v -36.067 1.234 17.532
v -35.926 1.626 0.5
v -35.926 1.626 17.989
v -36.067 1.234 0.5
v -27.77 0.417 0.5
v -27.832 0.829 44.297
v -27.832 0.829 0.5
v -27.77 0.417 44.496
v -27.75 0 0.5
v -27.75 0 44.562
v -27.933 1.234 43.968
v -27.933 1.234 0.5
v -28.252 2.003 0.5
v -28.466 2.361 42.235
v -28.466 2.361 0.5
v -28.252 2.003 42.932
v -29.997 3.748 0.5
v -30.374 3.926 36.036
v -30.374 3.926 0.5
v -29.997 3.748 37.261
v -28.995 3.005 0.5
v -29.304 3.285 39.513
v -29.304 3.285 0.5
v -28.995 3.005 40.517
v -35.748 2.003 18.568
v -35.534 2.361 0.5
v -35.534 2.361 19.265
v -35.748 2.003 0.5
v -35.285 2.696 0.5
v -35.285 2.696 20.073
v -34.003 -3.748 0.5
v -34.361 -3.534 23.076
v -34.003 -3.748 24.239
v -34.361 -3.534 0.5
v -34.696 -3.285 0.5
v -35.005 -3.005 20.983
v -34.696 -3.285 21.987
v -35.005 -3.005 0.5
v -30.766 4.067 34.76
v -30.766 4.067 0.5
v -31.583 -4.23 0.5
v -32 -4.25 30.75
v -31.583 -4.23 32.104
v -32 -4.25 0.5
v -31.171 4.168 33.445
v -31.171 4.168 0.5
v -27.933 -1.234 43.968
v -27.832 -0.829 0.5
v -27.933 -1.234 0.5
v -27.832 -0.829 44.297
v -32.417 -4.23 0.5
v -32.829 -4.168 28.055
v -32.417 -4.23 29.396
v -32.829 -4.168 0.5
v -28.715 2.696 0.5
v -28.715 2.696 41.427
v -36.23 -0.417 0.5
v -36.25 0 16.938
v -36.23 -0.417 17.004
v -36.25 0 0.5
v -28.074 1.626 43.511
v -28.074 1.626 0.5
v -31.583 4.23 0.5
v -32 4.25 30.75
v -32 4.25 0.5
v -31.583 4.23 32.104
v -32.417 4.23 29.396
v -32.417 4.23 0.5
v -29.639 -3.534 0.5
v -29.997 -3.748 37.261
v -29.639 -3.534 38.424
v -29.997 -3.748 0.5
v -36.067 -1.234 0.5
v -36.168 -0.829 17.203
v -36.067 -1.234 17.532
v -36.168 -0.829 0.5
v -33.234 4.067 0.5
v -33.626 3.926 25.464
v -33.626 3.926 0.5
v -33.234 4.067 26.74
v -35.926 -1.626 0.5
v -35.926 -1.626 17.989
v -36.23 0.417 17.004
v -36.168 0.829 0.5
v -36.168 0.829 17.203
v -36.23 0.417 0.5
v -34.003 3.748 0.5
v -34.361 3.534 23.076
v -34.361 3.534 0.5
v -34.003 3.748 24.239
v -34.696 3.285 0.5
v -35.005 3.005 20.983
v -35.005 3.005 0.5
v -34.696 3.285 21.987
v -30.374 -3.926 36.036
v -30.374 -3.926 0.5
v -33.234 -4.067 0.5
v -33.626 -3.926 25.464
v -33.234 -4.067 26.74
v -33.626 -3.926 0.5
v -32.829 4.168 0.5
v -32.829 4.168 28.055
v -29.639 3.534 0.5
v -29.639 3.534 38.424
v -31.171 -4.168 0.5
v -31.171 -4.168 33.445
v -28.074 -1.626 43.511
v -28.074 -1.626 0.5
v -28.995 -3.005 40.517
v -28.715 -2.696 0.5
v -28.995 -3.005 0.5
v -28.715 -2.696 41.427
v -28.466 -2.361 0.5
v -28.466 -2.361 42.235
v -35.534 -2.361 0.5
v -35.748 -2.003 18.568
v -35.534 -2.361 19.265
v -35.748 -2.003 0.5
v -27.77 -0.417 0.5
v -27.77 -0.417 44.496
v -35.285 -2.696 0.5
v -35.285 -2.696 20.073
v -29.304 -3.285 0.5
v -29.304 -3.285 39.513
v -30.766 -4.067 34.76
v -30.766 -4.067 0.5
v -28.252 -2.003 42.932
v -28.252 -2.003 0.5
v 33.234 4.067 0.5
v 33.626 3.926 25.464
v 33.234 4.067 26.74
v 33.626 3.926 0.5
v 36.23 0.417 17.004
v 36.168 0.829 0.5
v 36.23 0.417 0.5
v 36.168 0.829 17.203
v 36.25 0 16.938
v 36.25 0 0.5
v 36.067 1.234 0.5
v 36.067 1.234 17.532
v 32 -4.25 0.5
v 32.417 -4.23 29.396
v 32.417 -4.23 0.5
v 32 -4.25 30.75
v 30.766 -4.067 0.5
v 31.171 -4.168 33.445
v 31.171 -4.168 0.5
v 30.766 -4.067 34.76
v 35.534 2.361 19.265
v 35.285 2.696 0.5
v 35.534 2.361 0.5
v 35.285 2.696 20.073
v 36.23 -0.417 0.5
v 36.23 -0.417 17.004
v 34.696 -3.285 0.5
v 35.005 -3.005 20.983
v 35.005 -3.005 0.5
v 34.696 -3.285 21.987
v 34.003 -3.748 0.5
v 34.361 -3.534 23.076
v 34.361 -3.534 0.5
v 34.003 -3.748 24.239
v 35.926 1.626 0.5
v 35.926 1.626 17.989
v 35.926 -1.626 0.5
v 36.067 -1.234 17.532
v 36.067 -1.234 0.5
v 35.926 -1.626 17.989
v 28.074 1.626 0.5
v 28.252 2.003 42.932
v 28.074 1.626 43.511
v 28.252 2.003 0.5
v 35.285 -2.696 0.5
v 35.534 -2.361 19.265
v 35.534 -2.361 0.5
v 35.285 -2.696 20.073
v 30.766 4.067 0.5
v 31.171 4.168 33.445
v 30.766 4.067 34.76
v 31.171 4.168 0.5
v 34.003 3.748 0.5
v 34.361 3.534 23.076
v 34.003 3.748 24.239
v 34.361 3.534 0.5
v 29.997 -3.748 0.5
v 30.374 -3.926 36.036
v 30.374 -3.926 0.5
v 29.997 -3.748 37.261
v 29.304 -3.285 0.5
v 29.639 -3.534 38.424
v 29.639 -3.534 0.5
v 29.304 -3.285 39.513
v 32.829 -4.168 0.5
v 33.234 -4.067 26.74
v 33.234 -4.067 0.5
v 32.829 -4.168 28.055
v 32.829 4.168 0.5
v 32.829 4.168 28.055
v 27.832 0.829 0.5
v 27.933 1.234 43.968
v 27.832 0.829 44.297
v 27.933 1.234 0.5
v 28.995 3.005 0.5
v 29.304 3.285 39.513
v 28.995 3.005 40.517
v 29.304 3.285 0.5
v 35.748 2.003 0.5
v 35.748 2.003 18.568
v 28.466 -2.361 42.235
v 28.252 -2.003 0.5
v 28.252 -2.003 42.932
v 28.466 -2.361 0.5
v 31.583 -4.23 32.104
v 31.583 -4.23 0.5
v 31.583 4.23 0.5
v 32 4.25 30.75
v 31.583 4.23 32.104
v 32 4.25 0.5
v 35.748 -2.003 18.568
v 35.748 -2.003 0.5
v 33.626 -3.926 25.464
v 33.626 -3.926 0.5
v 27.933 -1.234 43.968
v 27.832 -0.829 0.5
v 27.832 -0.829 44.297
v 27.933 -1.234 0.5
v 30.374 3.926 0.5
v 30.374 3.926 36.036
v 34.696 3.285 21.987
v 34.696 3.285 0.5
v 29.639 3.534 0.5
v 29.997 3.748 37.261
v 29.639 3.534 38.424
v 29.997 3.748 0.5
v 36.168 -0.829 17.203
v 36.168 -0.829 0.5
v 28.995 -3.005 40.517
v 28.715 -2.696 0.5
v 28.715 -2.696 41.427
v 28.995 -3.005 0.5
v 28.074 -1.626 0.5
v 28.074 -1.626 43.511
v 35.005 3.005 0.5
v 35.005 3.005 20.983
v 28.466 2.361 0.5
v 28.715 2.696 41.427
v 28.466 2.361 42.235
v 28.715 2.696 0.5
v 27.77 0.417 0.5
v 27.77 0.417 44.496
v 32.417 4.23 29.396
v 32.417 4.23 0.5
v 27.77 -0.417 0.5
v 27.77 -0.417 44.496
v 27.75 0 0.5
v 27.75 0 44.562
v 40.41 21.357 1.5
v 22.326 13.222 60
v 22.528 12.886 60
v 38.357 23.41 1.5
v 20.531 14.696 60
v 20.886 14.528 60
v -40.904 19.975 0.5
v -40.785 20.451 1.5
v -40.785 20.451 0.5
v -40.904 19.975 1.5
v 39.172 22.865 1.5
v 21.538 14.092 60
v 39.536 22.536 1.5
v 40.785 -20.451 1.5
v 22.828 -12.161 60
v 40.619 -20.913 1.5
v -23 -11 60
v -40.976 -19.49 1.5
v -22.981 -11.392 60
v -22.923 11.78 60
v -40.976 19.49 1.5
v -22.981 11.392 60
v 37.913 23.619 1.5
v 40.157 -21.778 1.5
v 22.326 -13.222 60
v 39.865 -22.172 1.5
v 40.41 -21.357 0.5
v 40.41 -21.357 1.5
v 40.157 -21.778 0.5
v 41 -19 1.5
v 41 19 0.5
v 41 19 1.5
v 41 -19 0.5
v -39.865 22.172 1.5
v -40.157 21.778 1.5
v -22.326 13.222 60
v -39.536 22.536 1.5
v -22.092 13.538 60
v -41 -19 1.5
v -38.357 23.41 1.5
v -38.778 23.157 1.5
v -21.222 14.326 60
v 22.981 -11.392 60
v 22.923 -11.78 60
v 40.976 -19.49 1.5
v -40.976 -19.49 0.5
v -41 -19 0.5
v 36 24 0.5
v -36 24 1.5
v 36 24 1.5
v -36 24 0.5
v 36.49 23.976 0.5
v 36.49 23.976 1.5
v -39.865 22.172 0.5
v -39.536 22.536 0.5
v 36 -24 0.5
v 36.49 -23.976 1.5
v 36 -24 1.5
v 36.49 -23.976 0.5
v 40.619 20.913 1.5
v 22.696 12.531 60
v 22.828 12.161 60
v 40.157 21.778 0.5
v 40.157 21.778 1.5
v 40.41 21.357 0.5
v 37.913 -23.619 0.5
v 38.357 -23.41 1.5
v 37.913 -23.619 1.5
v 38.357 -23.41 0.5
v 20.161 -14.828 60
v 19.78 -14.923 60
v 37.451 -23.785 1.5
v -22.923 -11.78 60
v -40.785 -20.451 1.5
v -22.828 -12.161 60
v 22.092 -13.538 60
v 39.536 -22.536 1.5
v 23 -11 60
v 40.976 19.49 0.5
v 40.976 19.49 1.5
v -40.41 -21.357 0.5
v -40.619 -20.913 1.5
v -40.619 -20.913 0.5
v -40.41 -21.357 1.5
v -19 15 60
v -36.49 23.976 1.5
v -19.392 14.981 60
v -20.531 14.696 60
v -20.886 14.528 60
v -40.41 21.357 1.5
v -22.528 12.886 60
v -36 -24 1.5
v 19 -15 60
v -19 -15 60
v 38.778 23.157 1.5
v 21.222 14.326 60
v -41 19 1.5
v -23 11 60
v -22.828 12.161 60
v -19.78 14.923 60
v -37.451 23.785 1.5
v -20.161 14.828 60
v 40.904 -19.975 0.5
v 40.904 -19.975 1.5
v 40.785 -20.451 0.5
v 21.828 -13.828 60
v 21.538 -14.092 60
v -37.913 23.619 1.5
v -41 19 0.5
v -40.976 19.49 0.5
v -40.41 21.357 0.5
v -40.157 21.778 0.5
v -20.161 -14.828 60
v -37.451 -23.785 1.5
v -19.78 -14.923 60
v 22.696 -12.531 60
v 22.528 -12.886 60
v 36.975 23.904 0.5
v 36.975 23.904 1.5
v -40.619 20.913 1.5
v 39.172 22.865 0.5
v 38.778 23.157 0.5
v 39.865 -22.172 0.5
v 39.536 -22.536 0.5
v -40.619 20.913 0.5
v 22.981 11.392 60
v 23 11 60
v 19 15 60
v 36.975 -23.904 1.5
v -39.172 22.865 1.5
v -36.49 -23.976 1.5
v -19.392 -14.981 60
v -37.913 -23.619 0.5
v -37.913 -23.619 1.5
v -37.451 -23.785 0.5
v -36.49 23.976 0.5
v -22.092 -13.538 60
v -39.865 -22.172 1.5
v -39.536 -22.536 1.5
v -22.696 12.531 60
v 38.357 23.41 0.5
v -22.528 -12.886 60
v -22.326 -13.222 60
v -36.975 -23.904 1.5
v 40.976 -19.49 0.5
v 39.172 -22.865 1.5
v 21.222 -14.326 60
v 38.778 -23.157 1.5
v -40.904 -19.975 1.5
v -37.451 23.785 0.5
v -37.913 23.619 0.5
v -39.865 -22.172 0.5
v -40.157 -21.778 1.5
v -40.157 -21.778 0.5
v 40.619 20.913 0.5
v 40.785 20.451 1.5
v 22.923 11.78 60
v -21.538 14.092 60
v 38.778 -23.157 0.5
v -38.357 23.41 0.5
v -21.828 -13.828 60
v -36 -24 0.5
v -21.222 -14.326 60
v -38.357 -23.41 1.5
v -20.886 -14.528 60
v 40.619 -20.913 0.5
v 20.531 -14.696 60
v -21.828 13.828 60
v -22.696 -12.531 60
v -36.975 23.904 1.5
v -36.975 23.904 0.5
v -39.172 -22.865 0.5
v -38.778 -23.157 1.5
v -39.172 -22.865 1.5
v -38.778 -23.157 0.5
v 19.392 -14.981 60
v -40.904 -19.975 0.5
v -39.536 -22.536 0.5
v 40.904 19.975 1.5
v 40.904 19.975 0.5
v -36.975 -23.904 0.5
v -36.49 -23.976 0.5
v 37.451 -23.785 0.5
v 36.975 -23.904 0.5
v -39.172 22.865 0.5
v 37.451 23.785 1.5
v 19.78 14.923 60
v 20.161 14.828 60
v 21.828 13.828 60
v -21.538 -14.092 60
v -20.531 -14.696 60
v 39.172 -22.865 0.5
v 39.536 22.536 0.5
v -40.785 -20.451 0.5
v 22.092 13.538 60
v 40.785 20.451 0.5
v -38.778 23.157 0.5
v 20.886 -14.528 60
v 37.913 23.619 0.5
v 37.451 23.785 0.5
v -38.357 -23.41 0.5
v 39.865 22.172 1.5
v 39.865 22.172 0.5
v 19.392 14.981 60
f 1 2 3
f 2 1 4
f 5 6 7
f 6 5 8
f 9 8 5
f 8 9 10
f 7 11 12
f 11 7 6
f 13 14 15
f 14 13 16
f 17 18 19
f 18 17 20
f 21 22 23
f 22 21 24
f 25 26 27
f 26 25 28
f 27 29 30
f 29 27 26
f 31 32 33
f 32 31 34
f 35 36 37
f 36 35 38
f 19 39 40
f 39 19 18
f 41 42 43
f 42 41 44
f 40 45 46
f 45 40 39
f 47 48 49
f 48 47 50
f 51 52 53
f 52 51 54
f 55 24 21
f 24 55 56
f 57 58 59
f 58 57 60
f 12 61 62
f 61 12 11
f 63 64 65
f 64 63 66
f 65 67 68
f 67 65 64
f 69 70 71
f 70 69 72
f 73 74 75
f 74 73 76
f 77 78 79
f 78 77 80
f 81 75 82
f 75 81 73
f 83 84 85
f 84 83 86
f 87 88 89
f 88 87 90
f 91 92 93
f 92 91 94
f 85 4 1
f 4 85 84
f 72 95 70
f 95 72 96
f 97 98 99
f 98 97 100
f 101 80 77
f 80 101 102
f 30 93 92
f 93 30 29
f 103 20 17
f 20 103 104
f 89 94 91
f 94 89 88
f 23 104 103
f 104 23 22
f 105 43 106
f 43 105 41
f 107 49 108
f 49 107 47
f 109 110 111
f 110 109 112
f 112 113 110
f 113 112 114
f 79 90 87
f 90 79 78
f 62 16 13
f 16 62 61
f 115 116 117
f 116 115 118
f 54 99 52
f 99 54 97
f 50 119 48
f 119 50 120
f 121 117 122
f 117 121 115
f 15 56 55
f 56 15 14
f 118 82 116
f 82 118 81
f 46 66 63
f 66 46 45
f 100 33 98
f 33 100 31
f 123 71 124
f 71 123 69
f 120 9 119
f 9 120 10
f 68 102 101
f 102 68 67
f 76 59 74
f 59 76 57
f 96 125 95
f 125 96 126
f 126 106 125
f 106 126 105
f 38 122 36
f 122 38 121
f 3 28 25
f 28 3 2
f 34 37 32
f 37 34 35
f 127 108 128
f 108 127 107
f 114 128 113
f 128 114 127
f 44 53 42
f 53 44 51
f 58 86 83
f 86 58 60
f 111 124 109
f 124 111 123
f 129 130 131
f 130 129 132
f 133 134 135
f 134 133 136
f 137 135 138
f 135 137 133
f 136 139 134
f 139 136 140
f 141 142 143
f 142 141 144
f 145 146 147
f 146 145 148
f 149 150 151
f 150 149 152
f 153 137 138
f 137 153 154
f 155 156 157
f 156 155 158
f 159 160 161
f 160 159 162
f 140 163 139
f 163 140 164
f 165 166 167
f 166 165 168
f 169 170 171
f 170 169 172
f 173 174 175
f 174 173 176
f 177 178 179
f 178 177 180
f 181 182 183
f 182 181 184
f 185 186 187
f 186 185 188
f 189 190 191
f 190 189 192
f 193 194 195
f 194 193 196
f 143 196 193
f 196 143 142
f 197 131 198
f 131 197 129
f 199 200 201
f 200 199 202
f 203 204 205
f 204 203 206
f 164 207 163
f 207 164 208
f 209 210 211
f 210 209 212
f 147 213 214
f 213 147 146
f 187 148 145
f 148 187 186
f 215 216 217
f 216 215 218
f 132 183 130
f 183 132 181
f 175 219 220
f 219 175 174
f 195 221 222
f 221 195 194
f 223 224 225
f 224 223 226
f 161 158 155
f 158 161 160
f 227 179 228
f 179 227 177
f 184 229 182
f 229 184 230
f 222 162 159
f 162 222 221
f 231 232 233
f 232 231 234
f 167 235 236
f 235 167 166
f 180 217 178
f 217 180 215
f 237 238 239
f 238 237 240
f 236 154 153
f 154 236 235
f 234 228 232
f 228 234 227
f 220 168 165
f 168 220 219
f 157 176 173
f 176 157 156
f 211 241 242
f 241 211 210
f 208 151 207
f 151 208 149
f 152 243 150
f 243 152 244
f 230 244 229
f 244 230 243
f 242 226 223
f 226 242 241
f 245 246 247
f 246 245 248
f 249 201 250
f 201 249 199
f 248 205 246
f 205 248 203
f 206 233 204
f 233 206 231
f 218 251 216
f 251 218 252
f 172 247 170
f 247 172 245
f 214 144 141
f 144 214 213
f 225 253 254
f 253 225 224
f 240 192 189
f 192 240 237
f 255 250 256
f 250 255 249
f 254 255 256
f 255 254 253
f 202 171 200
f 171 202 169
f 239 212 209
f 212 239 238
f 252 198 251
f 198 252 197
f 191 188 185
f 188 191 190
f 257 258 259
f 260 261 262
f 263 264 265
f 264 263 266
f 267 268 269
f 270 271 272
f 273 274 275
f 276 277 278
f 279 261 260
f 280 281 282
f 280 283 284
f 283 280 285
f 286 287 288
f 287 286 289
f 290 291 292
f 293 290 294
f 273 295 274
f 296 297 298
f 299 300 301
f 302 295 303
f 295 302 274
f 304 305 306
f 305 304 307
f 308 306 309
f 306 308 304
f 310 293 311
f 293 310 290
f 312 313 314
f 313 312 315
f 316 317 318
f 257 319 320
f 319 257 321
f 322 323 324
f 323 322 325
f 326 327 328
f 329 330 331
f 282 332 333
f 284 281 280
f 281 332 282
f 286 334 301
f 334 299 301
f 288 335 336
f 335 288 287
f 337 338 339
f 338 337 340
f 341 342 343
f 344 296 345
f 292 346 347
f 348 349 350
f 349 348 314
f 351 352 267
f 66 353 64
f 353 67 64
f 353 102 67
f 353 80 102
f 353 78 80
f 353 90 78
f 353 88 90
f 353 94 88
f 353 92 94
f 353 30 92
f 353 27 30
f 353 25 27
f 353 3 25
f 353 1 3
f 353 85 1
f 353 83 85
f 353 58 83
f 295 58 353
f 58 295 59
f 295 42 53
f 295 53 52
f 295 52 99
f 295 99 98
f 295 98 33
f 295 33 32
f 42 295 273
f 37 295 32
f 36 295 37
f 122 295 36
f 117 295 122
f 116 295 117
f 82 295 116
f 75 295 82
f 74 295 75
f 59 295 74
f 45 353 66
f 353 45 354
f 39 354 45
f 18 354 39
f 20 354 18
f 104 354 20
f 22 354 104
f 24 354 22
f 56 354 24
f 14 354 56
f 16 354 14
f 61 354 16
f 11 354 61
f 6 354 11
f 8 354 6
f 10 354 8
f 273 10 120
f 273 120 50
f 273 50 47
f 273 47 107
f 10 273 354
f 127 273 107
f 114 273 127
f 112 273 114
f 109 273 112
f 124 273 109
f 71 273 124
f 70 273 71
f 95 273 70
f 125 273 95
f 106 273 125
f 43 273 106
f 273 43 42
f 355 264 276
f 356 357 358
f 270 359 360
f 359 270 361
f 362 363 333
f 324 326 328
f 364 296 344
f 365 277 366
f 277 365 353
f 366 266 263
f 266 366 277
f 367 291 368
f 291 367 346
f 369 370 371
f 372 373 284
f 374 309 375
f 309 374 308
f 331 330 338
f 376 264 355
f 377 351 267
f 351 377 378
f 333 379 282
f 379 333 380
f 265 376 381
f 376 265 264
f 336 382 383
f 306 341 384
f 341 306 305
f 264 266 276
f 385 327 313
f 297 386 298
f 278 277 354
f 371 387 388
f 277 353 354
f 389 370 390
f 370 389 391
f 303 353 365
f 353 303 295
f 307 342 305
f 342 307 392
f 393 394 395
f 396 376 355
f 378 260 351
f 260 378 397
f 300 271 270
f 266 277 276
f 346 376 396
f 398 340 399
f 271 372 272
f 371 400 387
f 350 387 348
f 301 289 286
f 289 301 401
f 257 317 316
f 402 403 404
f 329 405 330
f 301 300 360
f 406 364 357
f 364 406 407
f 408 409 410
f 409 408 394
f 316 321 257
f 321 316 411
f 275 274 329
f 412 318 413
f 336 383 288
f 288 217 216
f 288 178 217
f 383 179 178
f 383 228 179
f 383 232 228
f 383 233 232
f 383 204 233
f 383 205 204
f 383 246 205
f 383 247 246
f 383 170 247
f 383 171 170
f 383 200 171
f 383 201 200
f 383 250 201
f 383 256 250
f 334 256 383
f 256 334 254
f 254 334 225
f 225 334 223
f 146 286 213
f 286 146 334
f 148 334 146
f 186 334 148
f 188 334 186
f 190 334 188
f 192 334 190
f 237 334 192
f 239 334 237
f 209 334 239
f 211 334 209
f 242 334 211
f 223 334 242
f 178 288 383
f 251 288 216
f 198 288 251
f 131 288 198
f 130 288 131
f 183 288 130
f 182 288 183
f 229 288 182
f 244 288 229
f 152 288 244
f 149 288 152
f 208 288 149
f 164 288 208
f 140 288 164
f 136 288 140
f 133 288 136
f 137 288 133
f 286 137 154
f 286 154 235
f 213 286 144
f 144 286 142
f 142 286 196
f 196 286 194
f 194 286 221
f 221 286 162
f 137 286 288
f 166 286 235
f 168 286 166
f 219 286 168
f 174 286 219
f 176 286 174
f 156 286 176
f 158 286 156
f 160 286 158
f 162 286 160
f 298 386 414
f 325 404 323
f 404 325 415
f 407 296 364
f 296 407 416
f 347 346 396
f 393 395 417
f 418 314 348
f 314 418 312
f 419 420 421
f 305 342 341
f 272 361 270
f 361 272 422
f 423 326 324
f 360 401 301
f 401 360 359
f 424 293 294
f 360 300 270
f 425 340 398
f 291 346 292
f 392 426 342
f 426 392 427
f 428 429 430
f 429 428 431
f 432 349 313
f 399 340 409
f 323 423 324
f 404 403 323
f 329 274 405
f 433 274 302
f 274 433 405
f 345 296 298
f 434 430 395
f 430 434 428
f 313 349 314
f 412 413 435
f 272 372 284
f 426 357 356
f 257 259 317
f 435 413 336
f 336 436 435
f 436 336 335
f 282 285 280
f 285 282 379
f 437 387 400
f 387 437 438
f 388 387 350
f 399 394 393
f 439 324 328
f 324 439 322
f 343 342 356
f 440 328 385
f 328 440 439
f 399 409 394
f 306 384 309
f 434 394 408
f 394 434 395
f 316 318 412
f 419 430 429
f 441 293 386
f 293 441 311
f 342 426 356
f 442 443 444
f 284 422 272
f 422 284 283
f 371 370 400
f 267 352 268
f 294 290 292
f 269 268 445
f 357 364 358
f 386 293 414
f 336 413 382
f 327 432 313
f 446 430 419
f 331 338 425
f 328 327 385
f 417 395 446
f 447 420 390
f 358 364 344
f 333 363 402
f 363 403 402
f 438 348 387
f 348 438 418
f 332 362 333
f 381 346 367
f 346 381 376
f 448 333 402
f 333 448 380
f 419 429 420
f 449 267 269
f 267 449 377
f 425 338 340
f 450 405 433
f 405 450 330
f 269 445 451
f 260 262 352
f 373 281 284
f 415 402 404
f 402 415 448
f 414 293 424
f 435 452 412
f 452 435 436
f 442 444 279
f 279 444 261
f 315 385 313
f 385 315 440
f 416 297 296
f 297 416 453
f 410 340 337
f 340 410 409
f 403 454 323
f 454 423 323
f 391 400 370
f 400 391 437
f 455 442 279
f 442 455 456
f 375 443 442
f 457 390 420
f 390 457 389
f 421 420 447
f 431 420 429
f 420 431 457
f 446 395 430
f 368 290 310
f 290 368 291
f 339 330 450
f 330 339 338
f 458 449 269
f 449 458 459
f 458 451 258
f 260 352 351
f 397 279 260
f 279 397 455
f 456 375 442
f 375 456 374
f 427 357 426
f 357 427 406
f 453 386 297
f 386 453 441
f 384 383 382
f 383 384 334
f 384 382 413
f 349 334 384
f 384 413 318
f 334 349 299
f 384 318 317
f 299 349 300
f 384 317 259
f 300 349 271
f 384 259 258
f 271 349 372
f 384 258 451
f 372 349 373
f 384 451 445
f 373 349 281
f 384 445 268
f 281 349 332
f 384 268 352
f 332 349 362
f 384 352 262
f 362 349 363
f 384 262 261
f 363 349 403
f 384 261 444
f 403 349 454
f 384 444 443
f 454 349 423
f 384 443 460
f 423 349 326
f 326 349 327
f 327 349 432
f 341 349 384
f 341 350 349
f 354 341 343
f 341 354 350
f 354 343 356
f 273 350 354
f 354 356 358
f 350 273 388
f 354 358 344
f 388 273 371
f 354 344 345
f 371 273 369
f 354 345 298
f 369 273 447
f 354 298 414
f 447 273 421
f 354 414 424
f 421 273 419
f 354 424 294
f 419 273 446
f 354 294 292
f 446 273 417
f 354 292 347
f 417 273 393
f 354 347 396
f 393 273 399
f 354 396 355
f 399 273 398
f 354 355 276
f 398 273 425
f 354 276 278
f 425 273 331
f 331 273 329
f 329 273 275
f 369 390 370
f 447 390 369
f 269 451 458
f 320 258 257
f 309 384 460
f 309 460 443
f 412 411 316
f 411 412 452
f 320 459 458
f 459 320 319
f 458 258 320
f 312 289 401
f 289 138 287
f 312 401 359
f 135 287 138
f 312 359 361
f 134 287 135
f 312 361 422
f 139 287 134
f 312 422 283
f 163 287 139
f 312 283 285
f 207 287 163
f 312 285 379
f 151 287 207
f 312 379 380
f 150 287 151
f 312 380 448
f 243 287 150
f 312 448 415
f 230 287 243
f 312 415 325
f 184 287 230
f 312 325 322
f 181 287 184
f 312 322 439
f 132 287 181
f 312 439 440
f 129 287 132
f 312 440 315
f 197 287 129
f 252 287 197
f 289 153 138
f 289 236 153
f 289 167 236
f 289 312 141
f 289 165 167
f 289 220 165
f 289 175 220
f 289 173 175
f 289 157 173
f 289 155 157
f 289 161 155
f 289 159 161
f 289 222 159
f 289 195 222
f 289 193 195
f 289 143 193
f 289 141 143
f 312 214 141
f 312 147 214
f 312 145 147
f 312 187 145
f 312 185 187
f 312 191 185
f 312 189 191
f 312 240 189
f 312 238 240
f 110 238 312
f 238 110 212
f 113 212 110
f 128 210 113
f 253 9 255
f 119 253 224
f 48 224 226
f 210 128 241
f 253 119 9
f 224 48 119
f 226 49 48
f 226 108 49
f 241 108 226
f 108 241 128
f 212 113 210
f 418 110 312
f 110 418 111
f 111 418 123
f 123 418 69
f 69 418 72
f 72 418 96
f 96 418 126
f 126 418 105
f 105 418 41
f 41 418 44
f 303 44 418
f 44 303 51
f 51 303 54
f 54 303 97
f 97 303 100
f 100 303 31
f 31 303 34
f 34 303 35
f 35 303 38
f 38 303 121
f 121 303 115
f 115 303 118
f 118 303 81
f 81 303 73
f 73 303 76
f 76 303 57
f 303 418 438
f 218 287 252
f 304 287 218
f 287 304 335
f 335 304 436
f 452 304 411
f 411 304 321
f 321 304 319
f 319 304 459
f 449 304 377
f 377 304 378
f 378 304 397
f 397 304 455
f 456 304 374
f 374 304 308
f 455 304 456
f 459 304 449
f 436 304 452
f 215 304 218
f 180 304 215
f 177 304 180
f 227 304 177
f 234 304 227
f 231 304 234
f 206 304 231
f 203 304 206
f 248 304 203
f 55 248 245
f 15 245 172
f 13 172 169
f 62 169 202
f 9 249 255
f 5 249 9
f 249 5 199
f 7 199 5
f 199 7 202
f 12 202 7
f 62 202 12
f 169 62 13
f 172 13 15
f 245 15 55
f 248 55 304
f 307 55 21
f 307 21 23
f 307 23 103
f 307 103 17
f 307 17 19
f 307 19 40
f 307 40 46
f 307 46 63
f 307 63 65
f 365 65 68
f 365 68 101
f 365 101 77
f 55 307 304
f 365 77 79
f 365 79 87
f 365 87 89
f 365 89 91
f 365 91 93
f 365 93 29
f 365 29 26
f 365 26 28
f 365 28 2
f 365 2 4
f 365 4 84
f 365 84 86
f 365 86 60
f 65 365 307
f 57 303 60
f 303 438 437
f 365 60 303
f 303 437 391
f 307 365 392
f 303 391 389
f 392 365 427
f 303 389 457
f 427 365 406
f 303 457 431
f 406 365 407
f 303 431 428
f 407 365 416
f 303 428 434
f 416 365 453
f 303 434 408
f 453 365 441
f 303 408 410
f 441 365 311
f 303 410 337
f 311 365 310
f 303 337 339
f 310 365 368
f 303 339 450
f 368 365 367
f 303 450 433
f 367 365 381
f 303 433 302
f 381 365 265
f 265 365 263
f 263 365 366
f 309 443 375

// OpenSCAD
// BUMP-60020 short right-front bump stop model
// J40 rubber recreation 3D model, units: millimetres.
// Generated by tools/generate_rubber_recreation_3d_models.py.
// OpenSCAD is the source model; export STL only after release parameters are set.

$fn = 64;

module rounded_rect_2d(size, r) {
  hull() {
    translate([-(size[0] / 2 - r), -(size[1] / 2 - r)]) circle(r = r);
    translate([ (size[0] / 2 - r), -(size[1] / 2 - r)]) circle(r = r);
    translate([ (size[0] / 2 - r),  (size[1] / 2 - r)]) circle(r = r);
    translate([-(size[0] / 2 - r),  (size[1] / 2 - r)]) circle(r = r);
  }
}

module capsule_2d(length, width) {
  hull() {
    translate([-(length - width) / 2, 0]) circle(d = width);
    translate([ (length - width) / 2, 0]) circle(d = width);
  }
}

module chamfered_extrude(height, edge_chamfer = 0) {
  eps = 0.01;
  if (edge_chamfer <= 0) {
    linear_extrude(height = height, center = false)
      children();
  } else {
    union() {
      translate([0, 0, edge_chamfer])
        linear_extrude(height = height - (2 * edge_chamfer), center = false)
          children();

      hull() {
        translate([0, 0, 0])
          linear_extrude(height = eps, center = false)
            offset(delta = -edge_chamfer)
              children();
        translate([0, 0, edge_chamfer])
          linear_extrude(height = eps, center = false)
            children();
      }

      hull() {
        translate([0, 0, height - edge_chamfer])
          linear_extrude(height = eps, center = false)
            children();
        translate([0, 0, height - eps])
          linear_extrude(height = eps, center = false)
            offset(delta = -edge_chamfer)
              children();
      }
    }
  }
}

// Vehicle-measurement model:
// - Height is the known Toyota-family control.
// - This is a rubber-only stretch-fit bolt-on stop. There is no steel saddle
//   or backing plate in the part.
// - Rubber base footprint, bolt/stud pitch, relaxed hole or slot size, and
//   strike offset must come from the cleaned vehicle bracket and axle strike pad.
// - Default holes are relaxed undersize visual placeholders so the rubber can
//   stretch over/around the bolts or studs during installation.
// - This model is a first-article conversation shape, not a released mould.

module b_60020_short_measurement_model(
  free_height = 60,
  top_length = 46,
  top_width = 30,
  rubber_base_length = 82,
  rubber_base_width = 48,
  bolt_hole_pitch = 64,
  relaxed_hole_d = 8.5,
  stretch_slot_extra = 0
) {
  difference() {
    color("black")
      hull() {
        translate([0, 0, 0.5])
          linear_extrude(height = 1, center = false)
            rounded_rect_2d([rubber_base_length, rubber_base_width], 5);
        translate([0, 0, free_height - 1])
          linear_extrude(height = 1, center = false)
            rounded_rect_2d([top_length, top_width], 4);
      }

    if (relaxed_hole_d > 0 && bolt_hole_pitch > 0)
      for (x = [-bolt_hole_pitch / 2, bolt_hole_pitch / 2])
        translate([x, 0, -1])
          if (stretch_slot_extra > 0)
            linear_extrude(height = free_height + 2, center = false)
              capsule_2d(relaxed_hole_d + stretch_slot_extra, relaxed_hole_d);
          else
            cylinder(h = free_height + 2, d = relaxed_hole_d);
  }
}

b_60020_short_measurement_model();
